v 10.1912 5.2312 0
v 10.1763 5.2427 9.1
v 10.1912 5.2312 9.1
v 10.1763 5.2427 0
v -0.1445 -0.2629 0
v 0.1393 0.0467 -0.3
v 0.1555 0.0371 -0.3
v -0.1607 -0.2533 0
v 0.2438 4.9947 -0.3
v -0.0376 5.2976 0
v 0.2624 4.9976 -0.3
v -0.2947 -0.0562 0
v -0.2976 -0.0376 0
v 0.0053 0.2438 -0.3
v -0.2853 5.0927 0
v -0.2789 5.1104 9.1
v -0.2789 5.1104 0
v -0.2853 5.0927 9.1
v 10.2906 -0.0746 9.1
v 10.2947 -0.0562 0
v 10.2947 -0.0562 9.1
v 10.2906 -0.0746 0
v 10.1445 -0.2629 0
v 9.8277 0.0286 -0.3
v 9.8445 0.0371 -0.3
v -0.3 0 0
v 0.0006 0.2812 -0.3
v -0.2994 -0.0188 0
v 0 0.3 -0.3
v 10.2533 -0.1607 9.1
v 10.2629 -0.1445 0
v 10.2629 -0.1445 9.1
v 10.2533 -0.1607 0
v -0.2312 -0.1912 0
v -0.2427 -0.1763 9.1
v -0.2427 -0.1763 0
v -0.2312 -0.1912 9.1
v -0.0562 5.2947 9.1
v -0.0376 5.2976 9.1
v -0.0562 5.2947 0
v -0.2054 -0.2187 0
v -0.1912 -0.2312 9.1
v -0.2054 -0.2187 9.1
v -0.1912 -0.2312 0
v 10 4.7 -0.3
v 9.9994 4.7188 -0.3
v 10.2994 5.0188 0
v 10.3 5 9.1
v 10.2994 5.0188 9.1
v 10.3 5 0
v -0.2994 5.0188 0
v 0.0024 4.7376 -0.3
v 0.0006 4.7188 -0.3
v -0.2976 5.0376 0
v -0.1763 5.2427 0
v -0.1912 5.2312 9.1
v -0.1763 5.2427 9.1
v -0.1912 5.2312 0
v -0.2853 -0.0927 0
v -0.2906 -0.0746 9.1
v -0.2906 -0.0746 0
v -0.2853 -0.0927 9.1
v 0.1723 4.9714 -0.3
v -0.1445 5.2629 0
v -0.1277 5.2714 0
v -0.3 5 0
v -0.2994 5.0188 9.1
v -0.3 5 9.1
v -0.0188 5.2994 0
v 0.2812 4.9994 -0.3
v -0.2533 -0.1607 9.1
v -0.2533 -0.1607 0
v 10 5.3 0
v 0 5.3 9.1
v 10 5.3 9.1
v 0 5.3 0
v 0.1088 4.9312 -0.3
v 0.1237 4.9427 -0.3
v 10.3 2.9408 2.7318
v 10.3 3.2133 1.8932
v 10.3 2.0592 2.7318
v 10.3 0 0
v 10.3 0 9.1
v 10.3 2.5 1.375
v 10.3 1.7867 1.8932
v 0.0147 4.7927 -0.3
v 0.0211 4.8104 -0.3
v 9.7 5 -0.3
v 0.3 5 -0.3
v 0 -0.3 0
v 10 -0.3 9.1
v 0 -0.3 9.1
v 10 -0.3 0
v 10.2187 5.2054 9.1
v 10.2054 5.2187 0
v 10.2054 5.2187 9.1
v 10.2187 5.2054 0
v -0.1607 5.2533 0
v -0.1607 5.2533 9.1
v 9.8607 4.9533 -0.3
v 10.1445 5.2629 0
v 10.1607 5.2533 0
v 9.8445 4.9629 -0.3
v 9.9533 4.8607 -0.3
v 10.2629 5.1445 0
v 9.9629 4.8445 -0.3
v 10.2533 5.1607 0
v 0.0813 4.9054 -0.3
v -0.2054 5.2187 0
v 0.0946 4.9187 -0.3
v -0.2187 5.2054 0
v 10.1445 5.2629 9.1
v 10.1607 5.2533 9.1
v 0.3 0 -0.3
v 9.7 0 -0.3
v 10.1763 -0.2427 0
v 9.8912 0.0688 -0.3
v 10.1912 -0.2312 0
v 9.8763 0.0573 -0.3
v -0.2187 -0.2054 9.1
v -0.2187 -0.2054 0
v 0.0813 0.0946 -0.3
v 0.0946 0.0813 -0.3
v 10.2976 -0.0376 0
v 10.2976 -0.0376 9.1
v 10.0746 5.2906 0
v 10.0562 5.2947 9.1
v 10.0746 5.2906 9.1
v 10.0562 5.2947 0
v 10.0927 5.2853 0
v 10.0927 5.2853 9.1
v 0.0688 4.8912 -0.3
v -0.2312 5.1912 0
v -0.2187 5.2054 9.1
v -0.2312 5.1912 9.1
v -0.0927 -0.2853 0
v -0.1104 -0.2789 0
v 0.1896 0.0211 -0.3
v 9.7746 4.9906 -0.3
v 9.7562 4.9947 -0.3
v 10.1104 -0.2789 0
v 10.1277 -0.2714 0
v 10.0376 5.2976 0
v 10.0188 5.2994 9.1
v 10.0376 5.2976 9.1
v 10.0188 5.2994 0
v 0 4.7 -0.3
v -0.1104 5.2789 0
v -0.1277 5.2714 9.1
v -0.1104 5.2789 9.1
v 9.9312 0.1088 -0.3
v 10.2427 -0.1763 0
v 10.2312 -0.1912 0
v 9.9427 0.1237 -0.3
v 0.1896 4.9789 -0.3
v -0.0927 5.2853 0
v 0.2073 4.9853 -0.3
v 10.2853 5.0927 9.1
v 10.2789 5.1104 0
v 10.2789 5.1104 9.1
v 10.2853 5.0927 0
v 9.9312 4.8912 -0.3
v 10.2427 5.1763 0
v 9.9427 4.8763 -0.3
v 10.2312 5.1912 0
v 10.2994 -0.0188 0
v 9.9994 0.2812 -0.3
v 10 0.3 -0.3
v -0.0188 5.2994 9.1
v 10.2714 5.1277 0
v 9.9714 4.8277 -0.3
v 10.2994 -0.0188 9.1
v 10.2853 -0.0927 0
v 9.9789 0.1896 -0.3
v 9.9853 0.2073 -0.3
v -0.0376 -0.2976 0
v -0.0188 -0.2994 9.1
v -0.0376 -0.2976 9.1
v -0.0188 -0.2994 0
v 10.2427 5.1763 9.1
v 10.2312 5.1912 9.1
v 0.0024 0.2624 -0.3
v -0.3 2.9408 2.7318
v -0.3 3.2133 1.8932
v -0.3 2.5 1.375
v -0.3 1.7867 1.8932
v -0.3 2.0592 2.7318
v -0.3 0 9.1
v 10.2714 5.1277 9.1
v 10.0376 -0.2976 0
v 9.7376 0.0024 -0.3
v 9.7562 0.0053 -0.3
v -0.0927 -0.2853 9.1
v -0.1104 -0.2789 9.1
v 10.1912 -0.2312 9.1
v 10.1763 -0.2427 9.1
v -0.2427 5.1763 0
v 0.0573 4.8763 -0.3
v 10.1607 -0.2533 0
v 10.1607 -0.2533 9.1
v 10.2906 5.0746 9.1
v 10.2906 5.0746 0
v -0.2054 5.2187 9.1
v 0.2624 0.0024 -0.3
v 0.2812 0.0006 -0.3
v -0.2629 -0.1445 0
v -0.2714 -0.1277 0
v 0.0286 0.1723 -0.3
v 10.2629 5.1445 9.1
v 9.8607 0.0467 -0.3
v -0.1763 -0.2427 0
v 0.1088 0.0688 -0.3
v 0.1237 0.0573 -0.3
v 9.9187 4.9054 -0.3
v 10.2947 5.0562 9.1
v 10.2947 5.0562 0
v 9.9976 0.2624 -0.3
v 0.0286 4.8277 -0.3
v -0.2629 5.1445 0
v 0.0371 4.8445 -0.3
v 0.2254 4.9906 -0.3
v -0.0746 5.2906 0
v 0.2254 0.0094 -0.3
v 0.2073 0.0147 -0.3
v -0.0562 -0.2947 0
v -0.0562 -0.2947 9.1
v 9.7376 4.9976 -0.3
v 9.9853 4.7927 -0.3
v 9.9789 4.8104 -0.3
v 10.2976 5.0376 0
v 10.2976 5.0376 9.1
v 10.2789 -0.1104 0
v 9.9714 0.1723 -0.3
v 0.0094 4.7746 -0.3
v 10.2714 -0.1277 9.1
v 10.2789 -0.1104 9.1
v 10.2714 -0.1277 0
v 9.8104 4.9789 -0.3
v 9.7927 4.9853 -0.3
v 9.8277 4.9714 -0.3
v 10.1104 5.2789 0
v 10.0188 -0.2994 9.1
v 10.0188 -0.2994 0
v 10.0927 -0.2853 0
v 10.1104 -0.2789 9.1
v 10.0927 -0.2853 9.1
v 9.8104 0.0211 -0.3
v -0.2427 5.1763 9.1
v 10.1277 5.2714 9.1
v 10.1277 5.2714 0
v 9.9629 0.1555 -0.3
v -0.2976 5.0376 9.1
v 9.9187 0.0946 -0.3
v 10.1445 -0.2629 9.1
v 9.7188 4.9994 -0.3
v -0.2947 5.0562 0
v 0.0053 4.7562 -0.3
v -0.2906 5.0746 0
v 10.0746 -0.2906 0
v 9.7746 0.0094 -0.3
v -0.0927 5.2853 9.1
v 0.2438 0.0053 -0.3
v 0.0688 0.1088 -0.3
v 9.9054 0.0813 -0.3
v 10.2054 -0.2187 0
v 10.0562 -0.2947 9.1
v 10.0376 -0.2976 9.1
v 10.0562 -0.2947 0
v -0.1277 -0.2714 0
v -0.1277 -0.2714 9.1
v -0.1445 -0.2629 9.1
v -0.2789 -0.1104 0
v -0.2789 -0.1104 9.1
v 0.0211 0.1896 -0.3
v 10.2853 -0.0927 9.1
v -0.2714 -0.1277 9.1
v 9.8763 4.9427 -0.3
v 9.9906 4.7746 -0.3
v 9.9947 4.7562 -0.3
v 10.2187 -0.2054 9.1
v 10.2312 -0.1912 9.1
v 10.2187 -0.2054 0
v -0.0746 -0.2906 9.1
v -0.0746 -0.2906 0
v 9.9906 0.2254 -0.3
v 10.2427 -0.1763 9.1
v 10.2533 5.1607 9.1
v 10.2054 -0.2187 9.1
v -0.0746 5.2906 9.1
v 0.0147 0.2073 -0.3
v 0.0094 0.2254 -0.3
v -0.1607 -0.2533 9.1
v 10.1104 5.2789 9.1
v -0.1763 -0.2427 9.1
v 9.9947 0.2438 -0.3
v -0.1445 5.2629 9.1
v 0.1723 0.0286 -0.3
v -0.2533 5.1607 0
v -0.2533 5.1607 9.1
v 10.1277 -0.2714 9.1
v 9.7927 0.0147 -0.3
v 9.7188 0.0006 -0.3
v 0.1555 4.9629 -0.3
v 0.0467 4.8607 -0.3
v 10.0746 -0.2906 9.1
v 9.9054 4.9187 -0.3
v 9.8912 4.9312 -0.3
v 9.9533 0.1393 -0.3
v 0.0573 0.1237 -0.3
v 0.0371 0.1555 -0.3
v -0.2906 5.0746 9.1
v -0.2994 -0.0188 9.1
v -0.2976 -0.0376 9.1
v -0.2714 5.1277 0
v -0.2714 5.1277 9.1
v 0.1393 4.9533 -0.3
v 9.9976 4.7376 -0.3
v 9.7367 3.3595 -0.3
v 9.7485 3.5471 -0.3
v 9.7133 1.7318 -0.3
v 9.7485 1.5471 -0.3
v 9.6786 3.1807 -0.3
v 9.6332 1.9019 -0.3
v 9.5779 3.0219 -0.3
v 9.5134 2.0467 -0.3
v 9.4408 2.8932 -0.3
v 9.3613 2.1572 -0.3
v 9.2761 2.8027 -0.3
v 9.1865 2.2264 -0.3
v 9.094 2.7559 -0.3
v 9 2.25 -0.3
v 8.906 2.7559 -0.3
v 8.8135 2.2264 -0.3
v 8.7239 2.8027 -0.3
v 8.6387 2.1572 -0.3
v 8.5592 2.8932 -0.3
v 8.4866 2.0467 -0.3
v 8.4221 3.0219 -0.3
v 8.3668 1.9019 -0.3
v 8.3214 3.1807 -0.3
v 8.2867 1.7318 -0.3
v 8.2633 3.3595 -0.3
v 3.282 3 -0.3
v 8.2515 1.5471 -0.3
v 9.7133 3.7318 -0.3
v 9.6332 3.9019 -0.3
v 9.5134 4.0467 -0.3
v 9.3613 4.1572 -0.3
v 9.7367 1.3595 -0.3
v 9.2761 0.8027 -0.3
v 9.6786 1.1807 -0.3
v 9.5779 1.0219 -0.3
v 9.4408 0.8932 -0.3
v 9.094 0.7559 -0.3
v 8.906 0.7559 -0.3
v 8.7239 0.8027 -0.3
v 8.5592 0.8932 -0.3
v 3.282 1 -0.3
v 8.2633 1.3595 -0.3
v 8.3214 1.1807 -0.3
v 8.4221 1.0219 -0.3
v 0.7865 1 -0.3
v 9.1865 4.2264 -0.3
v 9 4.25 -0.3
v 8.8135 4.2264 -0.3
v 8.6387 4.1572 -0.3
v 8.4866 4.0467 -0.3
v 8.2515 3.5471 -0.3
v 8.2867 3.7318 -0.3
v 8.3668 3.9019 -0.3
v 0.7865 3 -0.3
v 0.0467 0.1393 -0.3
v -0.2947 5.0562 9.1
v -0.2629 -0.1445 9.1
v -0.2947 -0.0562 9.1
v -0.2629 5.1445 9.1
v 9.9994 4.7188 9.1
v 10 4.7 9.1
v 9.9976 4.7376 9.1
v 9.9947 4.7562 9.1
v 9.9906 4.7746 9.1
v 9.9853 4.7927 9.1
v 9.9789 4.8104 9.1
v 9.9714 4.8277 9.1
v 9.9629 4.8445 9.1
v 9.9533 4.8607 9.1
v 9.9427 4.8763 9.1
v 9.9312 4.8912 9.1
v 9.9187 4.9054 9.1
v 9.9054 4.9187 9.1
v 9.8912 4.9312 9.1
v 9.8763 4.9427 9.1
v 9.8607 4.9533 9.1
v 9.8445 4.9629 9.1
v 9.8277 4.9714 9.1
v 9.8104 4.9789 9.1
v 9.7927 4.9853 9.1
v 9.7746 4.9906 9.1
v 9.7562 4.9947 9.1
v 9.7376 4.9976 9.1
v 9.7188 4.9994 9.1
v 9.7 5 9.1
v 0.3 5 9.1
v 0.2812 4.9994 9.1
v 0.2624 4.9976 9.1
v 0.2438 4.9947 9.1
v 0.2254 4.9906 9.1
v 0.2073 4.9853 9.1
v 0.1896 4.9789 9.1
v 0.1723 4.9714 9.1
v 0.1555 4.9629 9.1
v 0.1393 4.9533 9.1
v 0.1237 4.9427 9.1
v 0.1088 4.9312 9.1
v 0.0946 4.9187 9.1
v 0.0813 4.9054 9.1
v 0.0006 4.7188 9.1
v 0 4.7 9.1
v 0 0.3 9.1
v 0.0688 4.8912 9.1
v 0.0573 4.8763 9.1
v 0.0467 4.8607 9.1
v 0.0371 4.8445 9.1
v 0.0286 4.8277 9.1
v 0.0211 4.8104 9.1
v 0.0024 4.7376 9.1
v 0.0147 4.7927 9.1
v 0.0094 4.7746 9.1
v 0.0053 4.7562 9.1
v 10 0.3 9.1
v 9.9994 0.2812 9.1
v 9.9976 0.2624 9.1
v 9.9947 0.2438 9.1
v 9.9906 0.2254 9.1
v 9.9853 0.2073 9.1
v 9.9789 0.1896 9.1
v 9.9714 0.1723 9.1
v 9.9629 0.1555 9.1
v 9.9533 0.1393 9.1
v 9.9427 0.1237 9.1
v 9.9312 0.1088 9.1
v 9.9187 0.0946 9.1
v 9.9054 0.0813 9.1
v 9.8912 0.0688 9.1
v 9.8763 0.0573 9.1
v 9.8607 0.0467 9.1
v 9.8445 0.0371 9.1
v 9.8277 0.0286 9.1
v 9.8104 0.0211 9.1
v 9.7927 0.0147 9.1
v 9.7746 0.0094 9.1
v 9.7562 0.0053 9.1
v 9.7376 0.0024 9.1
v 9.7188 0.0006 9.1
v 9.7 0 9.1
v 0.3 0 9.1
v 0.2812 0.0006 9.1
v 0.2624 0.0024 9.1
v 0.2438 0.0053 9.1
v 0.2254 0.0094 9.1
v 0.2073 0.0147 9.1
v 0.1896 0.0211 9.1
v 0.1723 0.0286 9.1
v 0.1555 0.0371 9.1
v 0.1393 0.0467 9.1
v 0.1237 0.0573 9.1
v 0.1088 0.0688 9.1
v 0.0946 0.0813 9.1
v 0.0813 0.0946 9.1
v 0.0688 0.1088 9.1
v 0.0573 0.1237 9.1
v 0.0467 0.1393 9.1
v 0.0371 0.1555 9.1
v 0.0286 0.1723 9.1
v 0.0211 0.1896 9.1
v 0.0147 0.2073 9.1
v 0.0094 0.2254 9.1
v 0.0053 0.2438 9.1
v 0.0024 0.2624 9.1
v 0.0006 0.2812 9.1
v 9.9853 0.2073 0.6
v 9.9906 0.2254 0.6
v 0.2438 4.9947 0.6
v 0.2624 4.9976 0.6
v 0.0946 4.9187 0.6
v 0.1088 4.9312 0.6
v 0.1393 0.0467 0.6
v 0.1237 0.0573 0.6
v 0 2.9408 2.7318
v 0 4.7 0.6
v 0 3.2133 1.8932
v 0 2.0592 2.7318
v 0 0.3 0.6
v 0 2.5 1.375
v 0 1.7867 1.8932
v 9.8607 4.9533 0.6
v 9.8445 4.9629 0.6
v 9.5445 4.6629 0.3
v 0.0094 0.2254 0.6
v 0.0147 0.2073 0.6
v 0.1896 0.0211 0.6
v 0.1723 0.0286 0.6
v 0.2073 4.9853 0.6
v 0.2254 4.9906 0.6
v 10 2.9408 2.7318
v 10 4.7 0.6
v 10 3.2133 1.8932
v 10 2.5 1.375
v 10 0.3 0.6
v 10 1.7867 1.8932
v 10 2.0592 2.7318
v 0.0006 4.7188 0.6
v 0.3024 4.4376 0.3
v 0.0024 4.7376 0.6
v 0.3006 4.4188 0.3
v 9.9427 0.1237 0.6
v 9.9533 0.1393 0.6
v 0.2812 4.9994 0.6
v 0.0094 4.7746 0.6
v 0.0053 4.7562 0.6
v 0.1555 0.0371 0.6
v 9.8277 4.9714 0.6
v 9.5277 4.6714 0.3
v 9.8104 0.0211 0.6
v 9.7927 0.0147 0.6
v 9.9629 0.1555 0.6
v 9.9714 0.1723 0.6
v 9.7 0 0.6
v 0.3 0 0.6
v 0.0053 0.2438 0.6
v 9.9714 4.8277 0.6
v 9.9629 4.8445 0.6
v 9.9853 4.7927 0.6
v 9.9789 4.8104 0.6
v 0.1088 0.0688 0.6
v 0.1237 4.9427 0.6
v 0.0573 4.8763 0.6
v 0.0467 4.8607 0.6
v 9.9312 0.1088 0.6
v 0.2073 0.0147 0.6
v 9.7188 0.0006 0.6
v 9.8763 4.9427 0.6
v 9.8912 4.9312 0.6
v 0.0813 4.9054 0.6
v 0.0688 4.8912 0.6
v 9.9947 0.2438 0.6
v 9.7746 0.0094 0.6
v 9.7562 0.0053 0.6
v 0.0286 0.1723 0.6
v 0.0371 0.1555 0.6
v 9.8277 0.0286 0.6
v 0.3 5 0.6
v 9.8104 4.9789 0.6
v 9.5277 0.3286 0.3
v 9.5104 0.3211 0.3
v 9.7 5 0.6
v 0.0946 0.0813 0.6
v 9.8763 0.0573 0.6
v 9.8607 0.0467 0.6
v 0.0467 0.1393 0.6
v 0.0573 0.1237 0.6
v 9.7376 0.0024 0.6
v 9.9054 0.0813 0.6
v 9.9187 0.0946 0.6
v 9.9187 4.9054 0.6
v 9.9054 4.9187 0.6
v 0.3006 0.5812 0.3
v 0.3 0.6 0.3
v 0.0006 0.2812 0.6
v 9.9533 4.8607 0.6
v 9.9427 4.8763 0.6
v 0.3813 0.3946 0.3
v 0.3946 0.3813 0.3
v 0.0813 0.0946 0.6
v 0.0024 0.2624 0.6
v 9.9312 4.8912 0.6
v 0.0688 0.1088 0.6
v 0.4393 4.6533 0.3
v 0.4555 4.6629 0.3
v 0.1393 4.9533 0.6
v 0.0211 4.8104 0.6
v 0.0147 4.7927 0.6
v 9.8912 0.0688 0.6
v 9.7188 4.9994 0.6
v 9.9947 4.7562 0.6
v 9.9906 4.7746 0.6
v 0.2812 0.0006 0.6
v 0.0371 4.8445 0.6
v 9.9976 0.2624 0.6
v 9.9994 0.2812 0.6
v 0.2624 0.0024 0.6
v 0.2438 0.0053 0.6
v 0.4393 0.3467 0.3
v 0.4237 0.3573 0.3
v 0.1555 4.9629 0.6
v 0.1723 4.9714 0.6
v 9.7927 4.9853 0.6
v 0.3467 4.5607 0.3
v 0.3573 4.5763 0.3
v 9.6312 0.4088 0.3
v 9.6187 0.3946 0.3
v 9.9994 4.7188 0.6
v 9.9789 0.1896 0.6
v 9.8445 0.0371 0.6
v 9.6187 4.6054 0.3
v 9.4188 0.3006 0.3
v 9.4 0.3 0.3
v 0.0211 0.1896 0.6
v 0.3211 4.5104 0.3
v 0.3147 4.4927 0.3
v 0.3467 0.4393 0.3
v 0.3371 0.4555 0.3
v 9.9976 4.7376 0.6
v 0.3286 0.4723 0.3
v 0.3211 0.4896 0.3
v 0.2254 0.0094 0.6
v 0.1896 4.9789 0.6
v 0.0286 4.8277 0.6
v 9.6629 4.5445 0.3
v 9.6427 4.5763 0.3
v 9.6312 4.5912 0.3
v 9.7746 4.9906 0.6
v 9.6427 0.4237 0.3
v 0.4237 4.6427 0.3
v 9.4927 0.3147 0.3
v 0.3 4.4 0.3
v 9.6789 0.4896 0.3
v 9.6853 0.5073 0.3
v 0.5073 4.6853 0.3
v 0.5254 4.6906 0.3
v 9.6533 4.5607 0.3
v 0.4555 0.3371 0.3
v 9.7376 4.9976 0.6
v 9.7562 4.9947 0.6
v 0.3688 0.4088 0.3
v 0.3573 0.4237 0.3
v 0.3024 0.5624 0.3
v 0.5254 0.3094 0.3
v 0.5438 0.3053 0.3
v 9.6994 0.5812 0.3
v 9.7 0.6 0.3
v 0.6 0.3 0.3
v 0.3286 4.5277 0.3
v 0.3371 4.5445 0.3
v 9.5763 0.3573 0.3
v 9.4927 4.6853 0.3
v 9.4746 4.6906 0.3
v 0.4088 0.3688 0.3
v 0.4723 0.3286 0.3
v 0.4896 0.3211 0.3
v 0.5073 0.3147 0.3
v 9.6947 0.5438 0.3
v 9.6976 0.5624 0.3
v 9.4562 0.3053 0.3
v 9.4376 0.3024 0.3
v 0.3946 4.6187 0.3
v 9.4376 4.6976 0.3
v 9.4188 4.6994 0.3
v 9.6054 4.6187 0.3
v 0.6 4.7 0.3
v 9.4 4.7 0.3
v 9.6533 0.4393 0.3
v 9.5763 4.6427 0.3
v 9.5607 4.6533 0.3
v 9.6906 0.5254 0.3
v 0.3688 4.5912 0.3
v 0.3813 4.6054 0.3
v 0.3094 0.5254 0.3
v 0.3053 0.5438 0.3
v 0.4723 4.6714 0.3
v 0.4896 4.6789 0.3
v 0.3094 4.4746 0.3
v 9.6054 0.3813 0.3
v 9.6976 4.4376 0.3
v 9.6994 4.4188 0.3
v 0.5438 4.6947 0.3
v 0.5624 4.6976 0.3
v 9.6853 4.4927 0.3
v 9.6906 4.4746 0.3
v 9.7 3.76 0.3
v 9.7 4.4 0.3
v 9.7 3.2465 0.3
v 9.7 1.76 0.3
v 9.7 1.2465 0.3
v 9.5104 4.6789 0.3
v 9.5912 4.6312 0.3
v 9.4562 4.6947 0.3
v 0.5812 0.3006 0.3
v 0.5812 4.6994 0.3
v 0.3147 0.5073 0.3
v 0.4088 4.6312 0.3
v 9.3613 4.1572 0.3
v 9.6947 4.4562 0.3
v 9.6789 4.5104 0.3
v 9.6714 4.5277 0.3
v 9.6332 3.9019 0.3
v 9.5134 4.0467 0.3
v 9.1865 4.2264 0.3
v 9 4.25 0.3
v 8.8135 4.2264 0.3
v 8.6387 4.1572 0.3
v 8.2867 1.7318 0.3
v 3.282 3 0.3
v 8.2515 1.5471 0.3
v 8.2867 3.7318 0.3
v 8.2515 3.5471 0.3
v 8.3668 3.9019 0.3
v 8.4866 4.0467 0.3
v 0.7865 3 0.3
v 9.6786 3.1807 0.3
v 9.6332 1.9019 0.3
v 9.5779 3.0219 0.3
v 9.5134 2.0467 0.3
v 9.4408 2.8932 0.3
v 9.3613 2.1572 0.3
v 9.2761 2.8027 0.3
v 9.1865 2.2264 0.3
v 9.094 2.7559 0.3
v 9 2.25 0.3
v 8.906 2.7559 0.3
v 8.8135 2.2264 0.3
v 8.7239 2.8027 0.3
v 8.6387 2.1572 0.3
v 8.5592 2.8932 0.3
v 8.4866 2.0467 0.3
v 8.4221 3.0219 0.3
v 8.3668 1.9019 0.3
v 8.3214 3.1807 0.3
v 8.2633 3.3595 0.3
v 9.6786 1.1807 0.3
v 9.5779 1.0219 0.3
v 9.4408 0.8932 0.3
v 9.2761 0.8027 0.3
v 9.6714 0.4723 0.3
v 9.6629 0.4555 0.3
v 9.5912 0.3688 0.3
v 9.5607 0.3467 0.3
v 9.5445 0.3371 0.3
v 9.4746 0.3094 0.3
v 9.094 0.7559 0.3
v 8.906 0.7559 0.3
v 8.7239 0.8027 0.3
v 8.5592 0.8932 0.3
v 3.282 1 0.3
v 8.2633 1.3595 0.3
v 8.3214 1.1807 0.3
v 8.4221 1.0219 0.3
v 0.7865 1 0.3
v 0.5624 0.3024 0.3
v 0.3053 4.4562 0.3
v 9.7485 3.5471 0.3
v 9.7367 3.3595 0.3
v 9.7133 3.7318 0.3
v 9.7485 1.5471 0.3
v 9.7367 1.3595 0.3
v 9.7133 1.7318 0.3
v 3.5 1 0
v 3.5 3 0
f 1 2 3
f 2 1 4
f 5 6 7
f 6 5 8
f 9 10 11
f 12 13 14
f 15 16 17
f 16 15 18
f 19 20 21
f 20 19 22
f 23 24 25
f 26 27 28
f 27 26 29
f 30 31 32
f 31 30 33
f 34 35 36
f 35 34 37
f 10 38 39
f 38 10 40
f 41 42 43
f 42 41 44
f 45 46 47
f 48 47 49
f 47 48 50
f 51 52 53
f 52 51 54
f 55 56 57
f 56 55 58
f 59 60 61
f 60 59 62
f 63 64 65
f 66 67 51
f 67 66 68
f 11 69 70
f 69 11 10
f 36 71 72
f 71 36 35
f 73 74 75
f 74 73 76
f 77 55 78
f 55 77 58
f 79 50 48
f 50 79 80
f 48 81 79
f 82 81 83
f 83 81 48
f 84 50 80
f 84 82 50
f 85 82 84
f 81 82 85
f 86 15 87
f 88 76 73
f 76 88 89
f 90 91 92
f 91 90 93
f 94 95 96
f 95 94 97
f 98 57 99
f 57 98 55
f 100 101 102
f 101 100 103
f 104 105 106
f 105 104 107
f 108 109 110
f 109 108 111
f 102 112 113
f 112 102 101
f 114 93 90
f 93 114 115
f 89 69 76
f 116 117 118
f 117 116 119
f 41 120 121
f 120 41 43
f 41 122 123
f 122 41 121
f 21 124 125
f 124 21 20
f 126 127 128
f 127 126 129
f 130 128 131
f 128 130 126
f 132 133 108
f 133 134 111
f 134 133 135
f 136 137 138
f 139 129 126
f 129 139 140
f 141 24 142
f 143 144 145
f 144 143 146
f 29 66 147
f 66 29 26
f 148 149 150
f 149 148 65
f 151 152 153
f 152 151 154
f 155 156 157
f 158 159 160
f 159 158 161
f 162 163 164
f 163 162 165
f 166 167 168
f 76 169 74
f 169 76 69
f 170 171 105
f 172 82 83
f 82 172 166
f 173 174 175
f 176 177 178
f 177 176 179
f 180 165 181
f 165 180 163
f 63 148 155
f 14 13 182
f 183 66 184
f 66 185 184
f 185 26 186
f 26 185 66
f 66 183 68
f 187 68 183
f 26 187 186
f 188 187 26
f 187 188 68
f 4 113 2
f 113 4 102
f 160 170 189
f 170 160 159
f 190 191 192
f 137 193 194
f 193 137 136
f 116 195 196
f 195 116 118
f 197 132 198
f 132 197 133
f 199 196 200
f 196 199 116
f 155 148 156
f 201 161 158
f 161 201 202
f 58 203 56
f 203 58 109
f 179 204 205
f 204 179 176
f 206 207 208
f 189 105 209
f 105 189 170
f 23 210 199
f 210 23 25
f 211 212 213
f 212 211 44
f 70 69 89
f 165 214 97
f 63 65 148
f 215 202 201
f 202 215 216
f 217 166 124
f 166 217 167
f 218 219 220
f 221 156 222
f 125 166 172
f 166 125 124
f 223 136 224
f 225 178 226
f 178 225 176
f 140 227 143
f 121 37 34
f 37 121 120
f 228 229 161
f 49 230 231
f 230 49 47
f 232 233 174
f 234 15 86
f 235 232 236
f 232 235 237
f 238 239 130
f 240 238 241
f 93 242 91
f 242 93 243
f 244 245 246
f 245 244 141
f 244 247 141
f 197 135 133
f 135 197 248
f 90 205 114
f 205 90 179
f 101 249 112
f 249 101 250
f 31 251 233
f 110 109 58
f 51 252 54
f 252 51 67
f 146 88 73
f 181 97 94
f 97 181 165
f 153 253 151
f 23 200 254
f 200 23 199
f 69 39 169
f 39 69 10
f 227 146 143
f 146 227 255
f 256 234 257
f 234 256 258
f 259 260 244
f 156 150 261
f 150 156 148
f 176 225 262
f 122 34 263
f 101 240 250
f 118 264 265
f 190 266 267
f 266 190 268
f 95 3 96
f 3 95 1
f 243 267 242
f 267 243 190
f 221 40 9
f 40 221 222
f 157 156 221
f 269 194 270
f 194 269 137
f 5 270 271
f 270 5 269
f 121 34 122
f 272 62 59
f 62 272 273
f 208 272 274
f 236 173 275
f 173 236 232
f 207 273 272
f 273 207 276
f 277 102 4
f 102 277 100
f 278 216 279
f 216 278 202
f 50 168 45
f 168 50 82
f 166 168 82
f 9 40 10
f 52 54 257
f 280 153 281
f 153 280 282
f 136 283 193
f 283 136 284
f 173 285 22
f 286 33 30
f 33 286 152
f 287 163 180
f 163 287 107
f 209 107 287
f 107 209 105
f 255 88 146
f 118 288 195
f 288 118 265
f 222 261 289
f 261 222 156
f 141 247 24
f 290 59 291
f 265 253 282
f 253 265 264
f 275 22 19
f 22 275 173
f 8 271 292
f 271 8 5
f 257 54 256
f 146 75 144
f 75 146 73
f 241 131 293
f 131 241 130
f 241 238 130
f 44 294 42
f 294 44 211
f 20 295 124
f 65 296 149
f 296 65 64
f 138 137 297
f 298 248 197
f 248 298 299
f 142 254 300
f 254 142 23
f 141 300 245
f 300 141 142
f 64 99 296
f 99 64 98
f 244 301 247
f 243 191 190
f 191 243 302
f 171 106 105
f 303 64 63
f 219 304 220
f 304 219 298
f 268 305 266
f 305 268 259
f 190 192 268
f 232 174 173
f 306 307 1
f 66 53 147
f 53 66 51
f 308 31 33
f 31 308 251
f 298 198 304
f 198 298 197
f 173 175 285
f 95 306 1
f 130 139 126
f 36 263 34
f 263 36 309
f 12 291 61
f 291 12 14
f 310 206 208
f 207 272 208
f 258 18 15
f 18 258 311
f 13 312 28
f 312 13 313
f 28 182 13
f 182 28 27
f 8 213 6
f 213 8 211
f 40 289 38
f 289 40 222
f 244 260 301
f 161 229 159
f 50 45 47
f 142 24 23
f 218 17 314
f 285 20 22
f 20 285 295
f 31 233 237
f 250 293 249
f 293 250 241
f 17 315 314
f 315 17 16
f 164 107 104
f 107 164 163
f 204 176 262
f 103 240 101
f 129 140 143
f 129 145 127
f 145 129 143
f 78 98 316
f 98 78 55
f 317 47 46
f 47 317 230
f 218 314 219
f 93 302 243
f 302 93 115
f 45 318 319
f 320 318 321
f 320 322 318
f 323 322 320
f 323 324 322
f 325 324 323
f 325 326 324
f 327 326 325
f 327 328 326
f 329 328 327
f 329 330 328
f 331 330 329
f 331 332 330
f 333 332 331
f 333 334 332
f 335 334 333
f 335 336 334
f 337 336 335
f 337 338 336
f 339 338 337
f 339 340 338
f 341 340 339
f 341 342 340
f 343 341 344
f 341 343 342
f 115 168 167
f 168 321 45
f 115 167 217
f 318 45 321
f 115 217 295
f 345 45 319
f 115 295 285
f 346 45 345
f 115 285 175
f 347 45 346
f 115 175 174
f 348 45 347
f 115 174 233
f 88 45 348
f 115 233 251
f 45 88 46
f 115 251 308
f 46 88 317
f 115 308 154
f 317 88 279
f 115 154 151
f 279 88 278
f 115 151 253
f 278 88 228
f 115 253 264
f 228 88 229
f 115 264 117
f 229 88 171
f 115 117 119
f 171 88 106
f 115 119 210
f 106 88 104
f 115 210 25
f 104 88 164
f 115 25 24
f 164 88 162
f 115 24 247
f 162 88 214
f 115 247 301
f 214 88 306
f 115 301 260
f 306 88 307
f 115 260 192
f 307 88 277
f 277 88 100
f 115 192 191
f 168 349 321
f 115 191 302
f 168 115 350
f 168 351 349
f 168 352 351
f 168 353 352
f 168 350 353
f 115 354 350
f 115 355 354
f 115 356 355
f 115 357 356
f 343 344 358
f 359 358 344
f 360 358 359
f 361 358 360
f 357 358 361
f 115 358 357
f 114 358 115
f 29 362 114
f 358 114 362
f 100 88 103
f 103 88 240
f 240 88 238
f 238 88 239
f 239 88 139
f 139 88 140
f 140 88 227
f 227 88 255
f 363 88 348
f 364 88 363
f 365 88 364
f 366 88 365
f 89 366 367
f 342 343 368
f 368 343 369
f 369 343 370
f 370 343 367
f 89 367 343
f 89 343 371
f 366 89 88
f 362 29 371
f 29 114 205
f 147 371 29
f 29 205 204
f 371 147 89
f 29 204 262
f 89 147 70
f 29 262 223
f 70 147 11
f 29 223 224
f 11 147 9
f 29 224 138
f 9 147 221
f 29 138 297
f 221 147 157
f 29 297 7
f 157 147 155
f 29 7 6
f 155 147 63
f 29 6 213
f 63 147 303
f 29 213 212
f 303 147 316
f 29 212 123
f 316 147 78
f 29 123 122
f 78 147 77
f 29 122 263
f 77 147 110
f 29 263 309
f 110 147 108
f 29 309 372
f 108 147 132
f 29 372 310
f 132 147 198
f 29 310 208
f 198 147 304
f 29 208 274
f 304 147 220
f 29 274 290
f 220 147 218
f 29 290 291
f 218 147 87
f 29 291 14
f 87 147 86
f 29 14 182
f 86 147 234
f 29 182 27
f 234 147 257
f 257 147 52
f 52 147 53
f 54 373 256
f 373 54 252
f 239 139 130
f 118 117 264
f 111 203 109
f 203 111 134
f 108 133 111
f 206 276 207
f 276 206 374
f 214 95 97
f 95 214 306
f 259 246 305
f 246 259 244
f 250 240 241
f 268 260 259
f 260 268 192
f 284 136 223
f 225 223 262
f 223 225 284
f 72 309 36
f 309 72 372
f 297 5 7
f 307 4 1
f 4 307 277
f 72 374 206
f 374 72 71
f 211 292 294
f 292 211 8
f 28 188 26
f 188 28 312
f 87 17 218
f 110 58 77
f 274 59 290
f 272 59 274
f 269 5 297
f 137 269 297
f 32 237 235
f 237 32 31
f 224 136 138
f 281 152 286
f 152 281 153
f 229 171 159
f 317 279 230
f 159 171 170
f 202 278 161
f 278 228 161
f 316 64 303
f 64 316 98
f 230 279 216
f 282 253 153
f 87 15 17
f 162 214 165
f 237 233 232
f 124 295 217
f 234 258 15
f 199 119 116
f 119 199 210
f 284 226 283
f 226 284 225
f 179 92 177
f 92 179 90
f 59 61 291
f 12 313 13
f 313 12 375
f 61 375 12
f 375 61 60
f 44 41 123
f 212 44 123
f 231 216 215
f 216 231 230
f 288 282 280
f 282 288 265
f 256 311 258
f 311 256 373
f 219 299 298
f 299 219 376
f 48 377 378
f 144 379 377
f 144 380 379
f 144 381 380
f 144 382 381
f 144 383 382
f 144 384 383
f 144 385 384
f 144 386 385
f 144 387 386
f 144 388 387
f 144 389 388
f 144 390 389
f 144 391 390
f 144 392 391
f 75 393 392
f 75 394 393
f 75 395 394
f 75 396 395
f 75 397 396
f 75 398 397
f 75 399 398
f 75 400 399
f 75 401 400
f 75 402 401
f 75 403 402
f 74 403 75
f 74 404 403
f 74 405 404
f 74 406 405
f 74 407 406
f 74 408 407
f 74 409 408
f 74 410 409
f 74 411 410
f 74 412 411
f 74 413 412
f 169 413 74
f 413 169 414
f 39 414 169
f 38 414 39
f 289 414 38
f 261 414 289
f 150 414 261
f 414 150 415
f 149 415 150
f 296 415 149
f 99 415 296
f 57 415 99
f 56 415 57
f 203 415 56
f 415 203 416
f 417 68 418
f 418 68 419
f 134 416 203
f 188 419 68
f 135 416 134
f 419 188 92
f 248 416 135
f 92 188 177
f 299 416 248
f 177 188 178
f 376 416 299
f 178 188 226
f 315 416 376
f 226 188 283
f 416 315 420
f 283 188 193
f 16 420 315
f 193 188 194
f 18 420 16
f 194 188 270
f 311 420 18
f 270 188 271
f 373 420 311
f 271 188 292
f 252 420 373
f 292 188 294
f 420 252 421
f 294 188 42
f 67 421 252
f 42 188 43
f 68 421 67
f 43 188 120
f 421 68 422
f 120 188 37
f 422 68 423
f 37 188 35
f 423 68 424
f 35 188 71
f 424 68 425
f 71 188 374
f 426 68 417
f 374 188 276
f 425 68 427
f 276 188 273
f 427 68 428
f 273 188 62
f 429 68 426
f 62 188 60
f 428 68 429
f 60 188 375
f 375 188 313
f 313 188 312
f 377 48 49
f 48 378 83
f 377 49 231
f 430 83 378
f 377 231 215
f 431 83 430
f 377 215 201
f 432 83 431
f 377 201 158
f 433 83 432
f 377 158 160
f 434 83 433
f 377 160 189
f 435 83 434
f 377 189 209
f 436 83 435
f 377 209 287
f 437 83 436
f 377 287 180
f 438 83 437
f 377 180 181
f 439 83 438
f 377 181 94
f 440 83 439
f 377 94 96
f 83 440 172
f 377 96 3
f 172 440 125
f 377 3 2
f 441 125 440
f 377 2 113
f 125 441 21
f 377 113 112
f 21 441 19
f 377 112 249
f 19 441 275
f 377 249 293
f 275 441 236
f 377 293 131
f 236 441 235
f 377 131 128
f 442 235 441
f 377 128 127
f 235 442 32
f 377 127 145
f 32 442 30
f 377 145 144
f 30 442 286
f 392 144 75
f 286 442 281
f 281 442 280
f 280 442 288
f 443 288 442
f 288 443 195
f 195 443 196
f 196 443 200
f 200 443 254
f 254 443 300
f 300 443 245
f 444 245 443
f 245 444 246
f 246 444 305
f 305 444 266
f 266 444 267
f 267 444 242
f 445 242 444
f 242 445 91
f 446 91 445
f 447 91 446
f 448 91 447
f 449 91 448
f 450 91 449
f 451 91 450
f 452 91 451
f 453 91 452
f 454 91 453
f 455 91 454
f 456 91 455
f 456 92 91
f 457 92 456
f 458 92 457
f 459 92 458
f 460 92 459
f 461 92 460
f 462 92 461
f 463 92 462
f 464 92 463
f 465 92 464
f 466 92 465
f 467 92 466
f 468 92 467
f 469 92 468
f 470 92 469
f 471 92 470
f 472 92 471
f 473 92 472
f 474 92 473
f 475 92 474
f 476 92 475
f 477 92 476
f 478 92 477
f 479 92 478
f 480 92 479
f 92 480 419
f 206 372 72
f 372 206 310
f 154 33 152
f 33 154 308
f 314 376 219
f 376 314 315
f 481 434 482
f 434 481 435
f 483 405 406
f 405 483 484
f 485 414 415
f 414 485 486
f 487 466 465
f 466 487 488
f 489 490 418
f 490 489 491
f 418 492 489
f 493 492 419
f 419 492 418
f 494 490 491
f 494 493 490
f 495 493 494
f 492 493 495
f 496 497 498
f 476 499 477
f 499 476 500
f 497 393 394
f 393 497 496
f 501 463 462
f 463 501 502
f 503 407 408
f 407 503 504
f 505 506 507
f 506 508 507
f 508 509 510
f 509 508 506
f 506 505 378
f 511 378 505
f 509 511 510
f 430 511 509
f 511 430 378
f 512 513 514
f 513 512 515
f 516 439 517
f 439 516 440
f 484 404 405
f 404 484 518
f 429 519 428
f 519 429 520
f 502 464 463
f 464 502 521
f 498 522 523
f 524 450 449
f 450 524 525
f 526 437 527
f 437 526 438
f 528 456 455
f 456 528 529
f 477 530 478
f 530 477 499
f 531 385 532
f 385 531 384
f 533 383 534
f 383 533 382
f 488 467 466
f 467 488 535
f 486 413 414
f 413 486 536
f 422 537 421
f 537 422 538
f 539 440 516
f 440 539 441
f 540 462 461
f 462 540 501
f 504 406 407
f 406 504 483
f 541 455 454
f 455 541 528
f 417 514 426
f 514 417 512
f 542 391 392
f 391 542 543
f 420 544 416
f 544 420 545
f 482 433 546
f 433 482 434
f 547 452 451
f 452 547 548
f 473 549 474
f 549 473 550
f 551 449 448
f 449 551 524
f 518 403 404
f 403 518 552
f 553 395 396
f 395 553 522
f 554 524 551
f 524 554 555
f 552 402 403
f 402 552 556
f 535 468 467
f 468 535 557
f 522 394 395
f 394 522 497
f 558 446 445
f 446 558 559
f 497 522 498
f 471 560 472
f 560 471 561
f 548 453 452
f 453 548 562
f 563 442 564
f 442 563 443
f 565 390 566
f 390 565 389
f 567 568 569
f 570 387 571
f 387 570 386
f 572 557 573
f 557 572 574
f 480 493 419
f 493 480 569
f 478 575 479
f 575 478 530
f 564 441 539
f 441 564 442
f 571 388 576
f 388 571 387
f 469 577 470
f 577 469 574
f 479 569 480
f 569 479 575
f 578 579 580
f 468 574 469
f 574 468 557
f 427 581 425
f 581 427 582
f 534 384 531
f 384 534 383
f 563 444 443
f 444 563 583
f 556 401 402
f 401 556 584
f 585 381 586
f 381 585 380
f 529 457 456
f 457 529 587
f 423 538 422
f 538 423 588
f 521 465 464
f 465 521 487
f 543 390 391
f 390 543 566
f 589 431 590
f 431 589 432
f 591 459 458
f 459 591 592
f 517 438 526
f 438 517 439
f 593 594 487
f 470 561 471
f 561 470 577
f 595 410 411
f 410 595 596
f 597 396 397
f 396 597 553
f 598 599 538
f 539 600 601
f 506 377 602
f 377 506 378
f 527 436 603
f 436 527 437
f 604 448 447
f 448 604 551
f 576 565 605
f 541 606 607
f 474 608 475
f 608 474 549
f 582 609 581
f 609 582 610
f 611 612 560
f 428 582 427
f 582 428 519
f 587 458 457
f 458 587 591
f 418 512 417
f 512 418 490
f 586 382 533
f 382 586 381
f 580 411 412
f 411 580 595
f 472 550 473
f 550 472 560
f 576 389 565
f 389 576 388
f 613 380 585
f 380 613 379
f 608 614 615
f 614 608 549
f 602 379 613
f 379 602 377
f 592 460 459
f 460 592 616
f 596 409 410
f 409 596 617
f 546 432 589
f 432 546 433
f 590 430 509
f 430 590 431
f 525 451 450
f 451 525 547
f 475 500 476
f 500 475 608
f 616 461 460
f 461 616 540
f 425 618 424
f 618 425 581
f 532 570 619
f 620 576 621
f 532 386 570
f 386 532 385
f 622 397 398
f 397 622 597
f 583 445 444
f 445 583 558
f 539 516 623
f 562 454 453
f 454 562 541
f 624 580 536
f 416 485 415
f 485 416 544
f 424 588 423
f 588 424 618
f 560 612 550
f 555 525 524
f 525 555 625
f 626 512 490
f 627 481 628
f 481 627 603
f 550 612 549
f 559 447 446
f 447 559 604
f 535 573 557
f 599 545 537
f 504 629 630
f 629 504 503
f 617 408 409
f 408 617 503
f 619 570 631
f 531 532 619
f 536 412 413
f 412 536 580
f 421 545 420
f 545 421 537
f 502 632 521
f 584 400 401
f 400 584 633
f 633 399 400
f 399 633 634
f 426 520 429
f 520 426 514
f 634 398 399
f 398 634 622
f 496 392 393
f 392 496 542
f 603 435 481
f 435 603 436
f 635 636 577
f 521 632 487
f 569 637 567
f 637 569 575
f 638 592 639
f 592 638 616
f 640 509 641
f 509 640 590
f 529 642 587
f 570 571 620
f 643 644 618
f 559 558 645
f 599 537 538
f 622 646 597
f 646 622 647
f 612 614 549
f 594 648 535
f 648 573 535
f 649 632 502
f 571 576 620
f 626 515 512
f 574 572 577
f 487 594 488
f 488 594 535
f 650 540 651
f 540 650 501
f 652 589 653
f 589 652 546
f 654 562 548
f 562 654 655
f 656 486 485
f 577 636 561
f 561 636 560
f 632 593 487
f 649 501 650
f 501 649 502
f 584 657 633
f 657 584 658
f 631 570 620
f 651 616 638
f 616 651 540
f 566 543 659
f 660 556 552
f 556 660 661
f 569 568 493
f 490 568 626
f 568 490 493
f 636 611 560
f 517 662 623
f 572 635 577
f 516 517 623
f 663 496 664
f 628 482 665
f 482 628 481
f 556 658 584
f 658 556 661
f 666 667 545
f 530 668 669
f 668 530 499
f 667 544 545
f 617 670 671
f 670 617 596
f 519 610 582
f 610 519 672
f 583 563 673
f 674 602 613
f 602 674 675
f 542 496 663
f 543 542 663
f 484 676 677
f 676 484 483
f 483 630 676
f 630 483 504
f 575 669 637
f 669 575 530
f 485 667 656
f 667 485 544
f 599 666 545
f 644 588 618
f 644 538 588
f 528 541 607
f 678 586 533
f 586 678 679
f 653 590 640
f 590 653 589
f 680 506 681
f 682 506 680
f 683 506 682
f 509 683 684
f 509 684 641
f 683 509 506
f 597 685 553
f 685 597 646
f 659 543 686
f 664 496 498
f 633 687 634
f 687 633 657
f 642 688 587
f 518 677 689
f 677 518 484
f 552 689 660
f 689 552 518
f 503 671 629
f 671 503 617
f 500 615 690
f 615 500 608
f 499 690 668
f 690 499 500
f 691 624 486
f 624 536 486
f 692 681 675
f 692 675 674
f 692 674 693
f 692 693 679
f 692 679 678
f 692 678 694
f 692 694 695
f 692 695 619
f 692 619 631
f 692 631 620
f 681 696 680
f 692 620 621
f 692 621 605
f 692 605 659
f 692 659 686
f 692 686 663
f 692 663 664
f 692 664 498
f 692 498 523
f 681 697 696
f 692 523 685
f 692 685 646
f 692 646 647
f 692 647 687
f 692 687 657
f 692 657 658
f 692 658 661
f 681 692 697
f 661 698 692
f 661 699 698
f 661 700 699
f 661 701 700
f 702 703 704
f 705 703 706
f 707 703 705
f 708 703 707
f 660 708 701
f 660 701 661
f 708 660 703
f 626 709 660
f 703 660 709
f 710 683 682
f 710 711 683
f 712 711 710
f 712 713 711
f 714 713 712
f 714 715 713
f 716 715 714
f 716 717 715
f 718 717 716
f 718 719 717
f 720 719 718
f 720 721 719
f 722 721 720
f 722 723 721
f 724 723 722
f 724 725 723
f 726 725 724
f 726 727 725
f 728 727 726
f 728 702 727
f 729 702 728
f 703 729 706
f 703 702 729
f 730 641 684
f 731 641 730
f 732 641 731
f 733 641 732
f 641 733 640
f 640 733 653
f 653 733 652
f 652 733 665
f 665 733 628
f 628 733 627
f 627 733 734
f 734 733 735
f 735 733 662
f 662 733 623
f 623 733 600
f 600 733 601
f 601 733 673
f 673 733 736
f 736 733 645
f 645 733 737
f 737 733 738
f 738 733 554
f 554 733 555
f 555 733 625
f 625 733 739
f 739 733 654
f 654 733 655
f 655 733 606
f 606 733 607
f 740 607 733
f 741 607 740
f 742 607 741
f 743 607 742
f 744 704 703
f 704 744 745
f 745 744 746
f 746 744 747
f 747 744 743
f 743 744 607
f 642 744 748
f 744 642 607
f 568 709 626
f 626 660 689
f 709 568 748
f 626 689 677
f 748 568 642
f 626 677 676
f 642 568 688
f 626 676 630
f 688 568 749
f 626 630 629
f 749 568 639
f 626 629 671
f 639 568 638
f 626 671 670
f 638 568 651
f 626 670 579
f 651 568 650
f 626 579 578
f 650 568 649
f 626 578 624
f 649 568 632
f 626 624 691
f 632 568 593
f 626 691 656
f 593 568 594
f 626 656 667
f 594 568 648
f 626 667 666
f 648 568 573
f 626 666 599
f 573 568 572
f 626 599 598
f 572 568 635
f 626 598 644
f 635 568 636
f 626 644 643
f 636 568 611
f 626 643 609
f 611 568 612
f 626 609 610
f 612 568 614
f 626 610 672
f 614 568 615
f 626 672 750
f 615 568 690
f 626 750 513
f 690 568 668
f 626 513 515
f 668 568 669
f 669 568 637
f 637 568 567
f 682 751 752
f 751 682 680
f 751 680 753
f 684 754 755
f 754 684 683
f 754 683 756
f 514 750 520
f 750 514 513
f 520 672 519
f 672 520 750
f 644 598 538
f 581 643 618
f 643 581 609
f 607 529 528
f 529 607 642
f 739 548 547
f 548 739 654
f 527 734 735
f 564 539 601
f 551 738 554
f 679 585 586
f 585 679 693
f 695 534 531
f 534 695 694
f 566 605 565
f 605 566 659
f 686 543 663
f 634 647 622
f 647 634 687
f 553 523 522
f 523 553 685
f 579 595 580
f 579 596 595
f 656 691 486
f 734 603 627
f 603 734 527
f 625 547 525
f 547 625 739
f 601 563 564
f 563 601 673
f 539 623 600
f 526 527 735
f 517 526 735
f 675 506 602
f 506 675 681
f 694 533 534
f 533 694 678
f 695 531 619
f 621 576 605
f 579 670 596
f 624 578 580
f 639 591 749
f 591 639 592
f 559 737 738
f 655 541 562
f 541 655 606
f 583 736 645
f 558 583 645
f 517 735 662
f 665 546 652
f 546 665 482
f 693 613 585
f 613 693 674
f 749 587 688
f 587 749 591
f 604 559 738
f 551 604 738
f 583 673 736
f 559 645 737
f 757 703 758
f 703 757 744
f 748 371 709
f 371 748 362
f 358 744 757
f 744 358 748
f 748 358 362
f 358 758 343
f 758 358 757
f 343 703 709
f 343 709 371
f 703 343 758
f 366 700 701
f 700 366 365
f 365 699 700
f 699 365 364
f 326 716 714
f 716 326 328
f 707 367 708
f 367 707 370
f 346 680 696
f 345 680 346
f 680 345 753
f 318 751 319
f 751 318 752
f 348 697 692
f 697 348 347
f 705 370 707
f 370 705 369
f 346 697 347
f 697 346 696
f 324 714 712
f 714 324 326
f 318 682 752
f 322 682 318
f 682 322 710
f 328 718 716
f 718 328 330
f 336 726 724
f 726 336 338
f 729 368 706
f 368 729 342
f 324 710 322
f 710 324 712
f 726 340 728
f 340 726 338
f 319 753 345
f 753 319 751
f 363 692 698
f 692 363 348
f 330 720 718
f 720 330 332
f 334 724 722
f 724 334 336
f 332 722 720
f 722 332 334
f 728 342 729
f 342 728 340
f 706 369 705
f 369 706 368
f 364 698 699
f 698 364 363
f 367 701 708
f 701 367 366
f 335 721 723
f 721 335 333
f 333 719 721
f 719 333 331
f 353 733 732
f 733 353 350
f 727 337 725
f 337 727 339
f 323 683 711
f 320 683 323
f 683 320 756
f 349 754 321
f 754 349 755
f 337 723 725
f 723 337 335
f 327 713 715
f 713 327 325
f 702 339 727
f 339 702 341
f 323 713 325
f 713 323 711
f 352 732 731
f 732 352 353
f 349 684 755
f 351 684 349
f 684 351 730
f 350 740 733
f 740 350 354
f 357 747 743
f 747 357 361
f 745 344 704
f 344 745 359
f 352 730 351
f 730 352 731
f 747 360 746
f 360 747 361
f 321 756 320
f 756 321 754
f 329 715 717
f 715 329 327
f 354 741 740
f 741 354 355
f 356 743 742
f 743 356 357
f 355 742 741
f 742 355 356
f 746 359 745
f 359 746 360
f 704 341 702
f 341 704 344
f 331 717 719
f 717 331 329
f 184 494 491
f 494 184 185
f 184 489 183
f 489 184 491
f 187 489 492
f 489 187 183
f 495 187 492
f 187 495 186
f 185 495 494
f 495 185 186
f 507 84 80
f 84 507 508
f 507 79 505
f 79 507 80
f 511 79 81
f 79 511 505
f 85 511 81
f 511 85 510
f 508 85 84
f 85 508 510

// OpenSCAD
// Dimensions of the box
length = 10;  // in cm
width = 5;  // in cm
height = 8.5;  // in cm

// Thickness of the box walls
wall_thickness = 0.3;  // in cm

// Fillet radius for rounded edges
fillet_radius = 0.3;  // in cm

// Hole dimensions
hole_diameter = 1.5;  // diameter of the holes in the bottom and side

// Create the main box
difference() {
    // Outer box
    translate([0, 0, -fillet_radius])
        roundedCube([length, width, height + 2*fillet_radius], fillet_radius);

    // Subtract the inner box to create walls
    translate([wall_thickness, wall_thickness, wall_thickness])
        roundedCube([length - 2*wall_thickness, width - 2*wall_thickness, height], fillet_radius);

    // Holes for Adafruit_SSD1306
    translate([length/2-3, width/2-0.5, 0])
        rotate([90, 0, 0])
        cylinder(h = 2, d = 3, center = true);

    // Holes for knobs
    translate([length/2+4, width/2+1, 0])
        rotate([0, 0, 90])
        cylinder(h = 2*wall_thickness, d = hole_diameter, center = true, $fn=25);
    translate([length/2+4, width/2-1, 0])
        rotate([0, 0, 90])
        cylinder(h = 2*wall_thickness, d = hole_diameter, center = true, $fn=25);

    // Holes for speakers on the sides
    translate([0, width/2, height/4])
        rotate([0, 90, 0])
        cylinder(h = height/2, d = hole_diameter, center = true);
    translate([length, width/2, height/4])
        rotate([0, 90, 0])
        cylinder(h = height/2, d = hole_diameter, center = true);
}

// Define a rounded cube using cylinders
module roundedCube(size, r) {
    hull() {
        translate([r, r, 0])
            cylinder(h = size[2], d = r*2, $fn = 100);
        translate([r, size[1] - r, 0])
            cylinder(h = size[2], d = r*2, $fn = 100);
        translate([size[0] - r, r, 0])
            cylinder(h = size[2], d = r*2, $fn = 100);
        translate([size[0] - r, size[1] - r, 0])
            cylinder(h = size[2], d = r*2, $fn = 100);
        translate([0, 0, r])
            cylinder(h = size[2], d = r*2, $fn = 100);
        translate([0, size[1], r])
            cylinder(h = size[2], d = r*2, $fn = 100);
        translate([size[0], 0, r])
            cylinder(h = size[2], d = r*2, $fn = 100);
        translate([size[0], size[1], r])
            cylinder(h = size[2], d = r*2, $fn = 100);
    }
}
